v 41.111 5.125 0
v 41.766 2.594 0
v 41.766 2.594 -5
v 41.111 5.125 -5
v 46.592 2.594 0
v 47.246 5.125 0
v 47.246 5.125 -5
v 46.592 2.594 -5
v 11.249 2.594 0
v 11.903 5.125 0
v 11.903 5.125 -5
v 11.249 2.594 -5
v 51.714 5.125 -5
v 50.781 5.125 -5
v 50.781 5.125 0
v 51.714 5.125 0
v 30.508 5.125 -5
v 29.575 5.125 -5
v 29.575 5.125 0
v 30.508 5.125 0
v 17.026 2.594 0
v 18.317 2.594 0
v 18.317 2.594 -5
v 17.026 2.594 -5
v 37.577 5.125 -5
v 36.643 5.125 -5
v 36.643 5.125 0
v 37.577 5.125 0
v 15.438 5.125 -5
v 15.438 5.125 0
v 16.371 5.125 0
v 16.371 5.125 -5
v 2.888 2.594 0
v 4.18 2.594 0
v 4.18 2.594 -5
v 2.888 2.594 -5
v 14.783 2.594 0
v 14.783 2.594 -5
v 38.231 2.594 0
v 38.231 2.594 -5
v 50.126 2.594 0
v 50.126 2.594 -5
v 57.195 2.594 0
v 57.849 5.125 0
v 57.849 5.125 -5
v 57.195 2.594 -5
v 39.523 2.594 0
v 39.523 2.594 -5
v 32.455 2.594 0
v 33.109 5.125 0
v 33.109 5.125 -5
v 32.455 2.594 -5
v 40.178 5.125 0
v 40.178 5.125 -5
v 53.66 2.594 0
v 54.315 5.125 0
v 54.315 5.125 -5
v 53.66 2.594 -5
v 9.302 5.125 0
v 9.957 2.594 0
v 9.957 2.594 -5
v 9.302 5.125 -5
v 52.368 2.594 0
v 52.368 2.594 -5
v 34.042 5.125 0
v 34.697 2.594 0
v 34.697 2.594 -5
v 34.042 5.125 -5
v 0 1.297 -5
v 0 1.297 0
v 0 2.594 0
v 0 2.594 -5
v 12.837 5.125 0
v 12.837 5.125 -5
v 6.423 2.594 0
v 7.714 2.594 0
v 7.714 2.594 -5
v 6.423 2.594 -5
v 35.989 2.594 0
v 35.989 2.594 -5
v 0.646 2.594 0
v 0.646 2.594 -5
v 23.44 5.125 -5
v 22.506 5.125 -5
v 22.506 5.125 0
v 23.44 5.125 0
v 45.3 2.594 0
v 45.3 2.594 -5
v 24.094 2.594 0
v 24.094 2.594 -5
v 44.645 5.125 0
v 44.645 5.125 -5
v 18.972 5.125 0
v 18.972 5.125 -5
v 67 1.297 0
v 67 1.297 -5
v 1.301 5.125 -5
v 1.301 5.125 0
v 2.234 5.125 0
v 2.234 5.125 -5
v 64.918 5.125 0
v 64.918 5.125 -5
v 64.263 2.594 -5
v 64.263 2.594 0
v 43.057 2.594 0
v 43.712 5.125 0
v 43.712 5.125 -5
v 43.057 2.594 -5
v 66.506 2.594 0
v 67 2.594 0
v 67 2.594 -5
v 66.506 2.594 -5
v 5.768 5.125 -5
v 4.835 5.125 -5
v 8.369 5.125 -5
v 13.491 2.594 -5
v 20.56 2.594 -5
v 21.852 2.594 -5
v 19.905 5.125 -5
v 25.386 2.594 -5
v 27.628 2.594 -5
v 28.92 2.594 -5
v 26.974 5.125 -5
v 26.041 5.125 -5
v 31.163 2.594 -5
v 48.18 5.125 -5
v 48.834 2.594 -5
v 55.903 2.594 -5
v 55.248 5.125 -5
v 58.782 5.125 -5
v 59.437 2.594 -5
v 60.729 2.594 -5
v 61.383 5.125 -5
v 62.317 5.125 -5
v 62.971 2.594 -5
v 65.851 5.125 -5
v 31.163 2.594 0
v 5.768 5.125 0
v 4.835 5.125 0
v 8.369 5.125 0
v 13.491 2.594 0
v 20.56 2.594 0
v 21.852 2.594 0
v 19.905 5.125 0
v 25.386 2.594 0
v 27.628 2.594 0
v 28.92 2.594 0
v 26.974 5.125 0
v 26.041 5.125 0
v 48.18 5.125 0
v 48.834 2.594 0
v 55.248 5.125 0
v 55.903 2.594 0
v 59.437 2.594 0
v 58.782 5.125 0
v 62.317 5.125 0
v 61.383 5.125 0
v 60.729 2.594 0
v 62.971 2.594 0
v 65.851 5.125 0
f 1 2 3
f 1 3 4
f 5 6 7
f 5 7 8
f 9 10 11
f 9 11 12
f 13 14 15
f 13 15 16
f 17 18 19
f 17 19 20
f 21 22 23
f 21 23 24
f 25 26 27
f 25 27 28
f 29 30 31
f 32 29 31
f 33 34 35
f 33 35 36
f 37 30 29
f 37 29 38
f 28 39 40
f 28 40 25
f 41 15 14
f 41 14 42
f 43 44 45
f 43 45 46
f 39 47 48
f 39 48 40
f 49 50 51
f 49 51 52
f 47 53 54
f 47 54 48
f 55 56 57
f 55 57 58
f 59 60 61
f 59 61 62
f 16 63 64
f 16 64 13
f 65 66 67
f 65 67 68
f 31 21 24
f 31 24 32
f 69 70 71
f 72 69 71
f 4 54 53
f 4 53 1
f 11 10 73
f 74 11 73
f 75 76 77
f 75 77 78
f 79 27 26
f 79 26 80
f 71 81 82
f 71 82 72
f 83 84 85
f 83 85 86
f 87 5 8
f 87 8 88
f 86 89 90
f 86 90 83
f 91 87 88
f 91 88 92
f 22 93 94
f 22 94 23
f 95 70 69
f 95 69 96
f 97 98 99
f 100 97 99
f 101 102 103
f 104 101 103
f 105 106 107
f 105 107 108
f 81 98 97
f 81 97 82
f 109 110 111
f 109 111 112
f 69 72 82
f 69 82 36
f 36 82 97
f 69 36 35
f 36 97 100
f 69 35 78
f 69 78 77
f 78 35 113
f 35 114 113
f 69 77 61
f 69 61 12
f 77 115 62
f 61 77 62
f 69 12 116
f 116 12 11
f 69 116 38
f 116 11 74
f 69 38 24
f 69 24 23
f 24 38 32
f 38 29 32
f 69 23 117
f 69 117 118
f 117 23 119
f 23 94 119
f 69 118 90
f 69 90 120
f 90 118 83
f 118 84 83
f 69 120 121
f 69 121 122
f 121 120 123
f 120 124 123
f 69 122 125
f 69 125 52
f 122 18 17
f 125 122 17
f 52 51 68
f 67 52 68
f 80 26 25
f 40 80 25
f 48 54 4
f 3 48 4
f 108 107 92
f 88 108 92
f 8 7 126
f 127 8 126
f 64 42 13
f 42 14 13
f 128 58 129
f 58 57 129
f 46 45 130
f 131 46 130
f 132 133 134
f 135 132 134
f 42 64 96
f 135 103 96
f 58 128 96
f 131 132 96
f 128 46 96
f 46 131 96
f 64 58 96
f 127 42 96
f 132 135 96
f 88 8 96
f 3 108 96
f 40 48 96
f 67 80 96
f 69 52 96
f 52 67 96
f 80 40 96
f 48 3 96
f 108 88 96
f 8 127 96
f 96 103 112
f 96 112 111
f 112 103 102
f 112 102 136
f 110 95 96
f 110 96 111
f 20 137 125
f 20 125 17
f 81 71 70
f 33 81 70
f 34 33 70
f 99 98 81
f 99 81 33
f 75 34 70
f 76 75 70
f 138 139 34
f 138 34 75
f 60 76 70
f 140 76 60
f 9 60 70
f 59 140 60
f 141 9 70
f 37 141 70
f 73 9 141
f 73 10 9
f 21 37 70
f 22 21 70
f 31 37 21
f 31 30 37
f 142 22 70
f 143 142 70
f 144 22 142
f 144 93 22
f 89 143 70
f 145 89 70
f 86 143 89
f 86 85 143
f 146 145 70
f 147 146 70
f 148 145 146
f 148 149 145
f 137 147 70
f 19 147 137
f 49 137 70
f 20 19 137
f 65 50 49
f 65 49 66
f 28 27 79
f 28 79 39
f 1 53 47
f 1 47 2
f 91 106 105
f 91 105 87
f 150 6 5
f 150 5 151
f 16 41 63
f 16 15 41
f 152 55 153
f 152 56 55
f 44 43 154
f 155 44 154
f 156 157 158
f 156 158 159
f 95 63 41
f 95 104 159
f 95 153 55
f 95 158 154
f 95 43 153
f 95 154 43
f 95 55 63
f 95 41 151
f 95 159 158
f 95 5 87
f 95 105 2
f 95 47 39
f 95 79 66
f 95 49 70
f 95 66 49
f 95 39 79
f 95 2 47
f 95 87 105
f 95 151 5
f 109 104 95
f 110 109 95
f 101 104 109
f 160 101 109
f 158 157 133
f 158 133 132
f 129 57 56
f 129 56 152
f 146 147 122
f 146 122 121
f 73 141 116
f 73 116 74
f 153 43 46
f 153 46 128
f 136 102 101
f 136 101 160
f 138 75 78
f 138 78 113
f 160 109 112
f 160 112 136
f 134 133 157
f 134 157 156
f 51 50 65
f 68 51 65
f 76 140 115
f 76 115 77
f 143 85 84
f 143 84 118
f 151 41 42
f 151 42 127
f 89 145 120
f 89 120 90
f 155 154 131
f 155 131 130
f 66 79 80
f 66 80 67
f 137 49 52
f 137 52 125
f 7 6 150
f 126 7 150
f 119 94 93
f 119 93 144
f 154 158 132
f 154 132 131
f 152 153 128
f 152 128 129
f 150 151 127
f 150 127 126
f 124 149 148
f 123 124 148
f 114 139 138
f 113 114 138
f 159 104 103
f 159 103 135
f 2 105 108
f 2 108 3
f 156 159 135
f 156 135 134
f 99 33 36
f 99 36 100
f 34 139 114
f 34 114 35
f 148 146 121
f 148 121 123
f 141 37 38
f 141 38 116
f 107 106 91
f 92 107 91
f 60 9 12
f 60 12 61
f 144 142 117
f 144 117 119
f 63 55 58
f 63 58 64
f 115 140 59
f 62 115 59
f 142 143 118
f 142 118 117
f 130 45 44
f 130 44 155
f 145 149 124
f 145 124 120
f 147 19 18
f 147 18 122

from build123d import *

# Parameters (mm, degrees)
BLANKSKE_W            = 67
BLANKSKE_H            = 5.125
BLANK_DEPTH           = 5
TOOTHCUTSIM_DEPTH     = 68.381493194
TEETHCUTS_COUNT       = 20
TEETHCUTS_PITCH       = 3.534291731
CROQUIS1_W            = 67
CROQUIS1_H            = 1.296875
CORTAR_EXTRUIR1_DEPTH = 10


with BuildPart() as part:
    # BlankSke → Blank (new body)
    with BuildSketch(Plane.XY):
        with Locations((33.5, 2.5625)):
            Rectangle(BLANKSKE_W, BLANKSKE_H)
    extrude(amount=-BLANK_DEPTH)

    # TooCutSkeSim → ToothCutSim (cut, through all)
    with BuildSketch(Plane.XY):
        Polygon((0.645891955, 2.59375), (-0.645891955, 2.59375), (-1.307086602, 5.1504), (1.307086602, 5.1504), align=None)
    toothcutsim = extrude(amount=-TOOTHCUTSIM_DEPTH, mode=Mode.SUBTRACT)

    # TeethCuts: ToothCutSim ×20
    with Locations(*[(i * TEETHCUTS_PITCH, 0, 0) for i in range(1, TEETHCUTS_COUNT)]):
        add(toothcutsim, mode=Mode.SUBTRACT)

    # Croquis1 → Cortar-Extruir1 (cut)
    with BuildSketch(Plane.XY):
        with Locations((33.5, 0.6484375)):
            Rectangle(CROQUIS1_W, CROQUIS1_H)
    extrude(amount=-CORTAR_EXTRUIR1_DEPTH, mode=Mode.SUBTRACT)


solid = part.part
